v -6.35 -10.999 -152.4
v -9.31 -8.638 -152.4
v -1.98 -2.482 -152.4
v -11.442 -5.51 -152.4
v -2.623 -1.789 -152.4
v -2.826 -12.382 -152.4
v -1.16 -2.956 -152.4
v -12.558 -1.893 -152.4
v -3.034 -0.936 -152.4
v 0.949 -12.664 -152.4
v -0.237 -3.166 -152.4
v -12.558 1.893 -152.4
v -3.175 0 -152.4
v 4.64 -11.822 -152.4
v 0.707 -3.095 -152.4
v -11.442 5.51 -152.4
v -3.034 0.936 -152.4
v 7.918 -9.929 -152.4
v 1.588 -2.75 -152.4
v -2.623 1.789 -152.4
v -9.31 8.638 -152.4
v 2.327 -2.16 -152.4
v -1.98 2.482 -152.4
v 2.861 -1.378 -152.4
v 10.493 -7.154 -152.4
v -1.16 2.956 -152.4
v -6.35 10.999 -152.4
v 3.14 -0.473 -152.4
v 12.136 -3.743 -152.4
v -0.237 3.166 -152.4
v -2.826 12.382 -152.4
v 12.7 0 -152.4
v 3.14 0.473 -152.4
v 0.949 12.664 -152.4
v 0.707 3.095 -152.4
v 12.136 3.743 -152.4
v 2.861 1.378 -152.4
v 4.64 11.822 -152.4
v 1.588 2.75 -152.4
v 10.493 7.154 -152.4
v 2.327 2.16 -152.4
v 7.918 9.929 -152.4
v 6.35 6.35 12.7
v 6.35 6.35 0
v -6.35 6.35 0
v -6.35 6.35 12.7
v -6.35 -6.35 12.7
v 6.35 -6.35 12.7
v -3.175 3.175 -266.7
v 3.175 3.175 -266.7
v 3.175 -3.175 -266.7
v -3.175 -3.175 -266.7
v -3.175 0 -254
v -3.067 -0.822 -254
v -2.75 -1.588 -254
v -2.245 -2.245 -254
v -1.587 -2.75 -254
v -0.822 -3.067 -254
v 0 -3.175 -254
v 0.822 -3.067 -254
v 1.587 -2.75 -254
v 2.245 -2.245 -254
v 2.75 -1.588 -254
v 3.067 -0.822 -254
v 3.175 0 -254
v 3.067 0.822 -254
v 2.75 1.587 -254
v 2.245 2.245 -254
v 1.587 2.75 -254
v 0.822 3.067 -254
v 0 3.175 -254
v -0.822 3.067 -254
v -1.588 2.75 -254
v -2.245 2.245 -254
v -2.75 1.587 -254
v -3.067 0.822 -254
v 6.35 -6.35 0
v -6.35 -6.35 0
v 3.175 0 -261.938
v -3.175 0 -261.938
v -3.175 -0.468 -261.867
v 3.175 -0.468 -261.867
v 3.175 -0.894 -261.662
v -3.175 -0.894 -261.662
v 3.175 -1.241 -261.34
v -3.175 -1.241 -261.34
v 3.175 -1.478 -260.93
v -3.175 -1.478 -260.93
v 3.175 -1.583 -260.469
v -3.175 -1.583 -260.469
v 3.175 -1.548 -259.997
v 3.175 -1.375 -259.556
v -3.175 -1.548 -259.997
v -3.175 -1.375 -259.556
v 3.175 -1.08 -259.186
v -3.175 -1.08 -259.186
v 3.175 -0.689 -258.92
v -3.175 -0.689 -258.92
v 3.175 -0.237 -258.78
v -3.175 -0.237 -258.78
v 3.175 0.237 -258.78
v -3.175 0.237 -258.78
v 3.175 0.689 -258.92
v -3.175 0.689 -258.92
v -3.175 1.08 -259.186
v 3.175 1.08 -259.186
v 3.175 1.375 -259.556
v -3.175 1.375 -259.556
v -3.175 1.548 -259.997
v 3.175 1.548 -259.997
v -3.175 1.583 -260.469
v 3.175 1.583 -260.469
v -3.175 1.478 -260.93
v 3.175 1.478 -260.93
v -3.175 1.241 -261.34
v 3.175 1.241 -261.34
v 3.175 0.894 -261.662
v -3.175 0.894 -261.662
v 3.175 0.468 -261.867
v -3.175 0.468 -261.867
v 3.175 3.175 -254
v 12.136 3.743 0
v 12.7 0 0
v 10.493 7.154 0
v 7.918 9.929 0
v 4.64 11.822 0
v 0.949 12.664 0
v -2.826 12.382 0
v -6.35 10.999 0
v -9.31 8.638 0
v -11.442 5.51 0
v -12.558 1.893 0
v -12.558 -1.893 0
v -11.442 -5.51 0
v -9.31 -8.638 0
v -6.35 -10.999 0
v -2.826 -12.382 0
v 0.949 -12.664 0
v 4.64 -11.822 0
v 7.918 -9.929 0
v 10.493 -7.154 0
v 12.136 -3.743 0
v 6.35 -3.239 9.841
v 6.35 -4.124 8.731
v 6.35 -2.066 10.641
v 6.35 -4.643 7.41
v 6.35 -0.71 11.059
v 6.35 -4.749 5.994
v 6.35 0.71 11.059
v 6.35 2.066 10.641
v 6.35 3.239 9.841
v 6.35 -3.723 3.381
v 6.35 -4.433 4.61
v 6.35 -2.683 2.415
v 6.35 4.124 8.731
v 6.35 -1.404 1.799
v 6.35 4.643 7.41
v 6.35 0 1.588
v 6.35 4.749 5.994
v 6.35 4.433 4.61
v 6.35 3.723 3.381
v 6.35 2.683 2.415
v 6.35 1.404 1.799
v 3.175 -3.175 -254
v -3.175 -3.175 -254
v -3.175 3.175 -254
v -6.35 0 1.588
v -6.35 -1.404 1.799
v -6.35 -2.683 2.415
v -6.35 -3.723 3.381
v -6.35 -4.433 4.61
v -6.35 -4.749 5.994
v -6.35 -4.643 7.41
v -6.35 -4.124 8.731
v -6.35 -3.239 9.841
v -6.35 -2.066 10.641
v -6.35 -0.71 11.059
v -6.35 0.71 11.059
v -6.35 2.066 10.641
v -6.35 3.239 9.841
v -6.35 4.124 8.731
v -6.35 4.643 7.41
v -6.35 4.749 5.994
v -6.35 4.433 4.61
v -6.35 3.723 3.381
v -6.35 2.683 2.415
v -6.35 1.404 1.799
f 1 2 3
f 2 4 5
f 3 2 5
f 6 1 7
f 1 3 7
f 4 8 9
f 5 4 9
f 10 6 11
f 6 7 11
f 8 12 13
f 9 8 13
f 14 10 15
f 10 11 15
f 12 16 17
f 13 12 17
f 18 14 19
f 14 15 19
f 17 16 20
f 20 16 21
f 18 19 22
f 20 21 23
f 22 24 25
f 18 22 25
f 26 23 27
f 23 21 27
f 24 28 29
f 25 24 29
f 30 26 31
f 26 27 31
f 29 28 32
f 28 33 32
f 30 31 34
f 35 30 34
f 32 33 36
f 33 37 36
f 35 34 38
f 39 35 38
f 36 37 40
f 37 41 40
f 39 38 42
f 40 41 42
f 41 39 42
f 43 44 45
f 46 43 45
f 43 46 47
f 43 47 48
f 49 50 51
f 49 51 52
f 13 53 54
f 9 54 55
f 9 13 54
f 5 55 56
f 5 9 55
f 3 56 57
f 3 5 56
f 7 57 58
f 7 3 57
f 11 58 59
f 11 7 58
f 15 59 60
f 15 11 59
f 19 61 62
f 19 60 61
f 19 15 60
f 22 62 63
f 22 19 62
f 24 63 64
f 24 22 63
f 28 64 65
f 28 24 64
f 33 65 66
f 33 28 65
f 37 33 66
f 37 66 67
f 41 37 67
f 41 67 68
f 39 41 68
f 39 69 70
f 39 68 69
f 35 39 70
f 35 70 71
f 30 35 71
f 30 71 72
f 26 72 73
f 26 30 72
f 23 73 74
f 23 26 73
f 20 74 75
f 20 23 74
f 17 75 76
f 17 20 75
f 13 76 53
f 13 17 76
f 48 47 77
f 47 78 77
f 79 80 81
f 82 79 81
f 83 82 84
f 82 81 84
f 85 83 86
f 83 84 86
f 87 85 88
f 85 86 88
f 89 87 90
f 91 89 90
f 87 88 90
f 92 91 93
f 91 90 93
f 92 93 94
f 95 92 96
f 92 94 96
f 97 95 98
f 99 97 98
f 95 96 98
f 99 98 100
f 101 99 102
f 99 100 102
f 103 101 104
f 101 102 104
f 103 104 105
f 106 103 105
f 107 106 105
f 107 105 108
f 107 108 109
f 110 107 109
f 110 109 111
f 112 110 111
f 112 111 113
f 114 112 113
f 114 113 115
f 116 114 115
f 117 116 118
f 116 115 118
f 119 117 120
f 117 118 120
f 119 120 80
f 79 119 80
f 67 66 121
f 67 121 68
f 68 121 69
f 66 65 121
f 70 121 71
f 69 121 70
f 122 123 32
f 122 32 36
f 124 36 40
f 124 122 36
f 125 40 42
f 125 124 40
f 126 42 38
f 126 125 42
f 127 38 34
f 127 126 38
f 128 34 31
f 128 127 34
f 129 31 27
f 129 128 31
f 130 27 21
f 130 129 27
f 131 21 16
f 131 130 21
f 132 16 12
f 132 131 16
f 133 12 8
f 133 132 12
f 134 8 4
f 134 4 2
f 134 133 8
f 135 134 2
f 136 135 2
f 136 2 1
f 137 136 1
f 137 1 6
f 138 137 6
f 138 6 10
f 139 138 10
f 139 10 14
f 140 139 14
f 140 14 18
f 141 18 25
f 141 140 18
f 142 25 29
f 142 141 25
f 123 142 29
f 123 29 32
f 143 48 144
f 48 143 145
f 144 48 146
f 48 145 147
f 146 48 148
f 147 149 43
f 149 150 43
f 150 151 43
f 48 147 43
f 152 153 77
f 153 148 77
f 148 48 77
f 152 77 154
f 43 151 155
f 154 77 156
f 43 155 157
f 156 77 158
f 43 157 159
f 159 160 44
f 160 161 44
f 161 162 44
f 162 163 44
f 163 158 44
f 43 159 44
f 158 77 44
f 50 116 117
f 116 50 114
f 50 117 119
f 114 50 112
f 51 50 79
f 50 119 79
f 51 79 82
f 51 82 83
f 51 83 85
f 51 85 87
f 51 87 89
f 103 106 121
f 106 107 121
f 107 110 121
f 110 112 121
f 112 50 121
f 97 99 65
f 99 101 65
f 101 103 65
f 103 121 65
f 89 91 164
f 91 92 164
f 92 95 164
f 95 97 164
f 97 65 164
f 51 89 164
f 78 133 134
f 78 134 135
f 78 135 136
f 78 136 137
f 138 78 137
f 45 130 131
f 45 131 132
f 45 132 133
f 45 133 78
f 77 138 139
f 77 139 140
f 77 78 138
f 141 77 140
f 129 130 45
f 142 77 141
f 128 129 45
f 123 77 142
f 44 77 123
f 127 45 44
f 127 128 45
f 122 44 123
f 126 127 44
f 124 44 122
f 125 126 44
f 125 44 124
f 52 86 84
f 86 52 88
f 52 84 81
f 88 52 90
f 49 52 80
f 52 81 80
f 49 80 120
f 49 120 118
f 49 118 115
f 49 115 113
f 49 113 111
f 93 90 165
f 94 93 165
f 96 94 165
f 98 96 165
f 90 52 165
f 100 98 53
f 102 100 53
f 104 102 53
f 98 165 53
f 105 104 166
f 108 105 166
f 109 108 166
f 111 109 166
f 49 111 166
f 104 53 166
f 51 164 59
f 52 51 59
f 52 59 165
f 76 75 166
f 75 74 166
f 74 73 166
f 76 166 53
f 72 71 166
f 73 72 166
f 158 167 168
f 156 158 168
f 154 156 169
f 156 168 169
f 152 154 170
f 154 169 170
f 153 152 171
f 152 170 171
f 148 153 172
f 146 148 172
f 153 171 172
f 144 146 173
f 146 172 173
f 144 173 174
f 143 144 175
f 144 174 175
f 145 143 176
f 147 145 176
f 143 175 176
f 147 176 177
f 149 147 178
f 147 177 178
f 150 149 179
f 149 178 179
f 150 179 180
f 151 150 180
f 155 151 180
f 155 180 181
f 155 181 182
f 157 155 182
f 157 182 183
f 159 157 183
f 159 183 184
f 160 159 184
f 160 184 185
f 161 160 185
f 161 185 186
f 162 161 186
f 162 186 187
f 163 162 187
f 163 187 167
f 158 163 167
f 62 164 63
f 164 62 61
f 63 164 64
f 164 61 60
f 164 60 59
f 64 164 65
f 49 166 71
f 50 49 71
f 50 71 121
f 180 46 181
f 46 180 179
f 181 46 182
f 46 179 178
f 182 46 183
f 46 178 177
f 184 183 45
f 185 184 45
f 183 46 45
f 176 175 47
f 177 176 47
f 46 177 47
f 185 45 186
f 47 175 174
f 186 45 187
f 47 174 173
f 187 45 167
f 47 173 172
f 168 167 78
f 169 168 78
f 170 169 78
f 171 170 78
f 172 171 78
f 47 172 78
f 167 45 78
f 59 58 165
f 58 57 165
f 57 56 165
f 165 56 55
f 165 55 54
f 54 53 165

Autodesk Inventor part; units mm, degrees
ref_plane "YZ Plane" through (0, 0, 0) normal (1, 0, 0) x (0, 1, 0)
ref_plane "XZ Plane" through (0, 0, 0) normal (0, 1, 0) x (-1, 0, 0)
ref_plane "XY Plane" through (0, 0, 0) normal (0, 0, 1) x (1, 0, 0)
sketch "Sketch1" plane through (0, 0, 0) normal (0, 0, 1) x (1, 0, 0)
  circle A0 centre (0, 0) radius 12.7
  line L0 (-6.35, -6.35) -> (6.35, -6.35)
  line L1 (6.35, -6.35) -> (6.35, 6.35)
  line L2 (6.35, 6.35) -> (-6.35, 6.35)
  line L3 (-6.35, 6.35) -> (-6.35, -6.35)
  point P0 (-6.35, 0)
  point P1 (0, 6.35)
  dimension "d0" = 25.4
  dimension "d1" = 12.7
  dimension "d2" = 12.7
extrude "Extrusion1" add sketch "Sketch1" against normal blind 152.4 contours A0 | L3 L2 L1 L0
extrude "Extrusion2" add sketch "Sketch1" along normal blind 12.7 contours L3 L2 L1 L0
sketch "Sketch2" plane through (6.35, -6.35, 12.7) normal (1, 0, 0) x (0, 0, -1)
  point P0 (12.7, 6.35)
  point P1 (6.35, 6.35)
hole "Hole1" at (6.35, 0, 6.35) direction (-1, 0, 0) diameter 9.525 depth 25.4 tip angle 118
thread "Thread1" size "3/8-16 UNC" class "2B" standard "ANSI Unified Screw Threads" full length
sketch "Sketch3" plane through (0, 0, -152.4) normal (0, 0, -1) x (-1, 0, 0)
  circle A0 centre (0, 0) radius 12.7 projected
  circle A1 centre (0, 0) radius 3.175
  dimension "d16" = 6.35
extrude "Extrusion3" add sketch "Sketch3" along normal blind 101.6 contours A1
sketch "Sketch4" plane through (0, 0, -254) normal (0, 0, -1) x (-1, 0, 0)
  circle A0 centre (0, 0) radius 3.175 projected
  line L0 (-3.175, -3.175) -> (3.175, -3.175)
  line L1 (3.175, -3.175) -> (3.175, 3.175)
  line L2 (3.175, 3.175) -> (-3.175, 3.175)
  line L3 (-3.175, 3.175) -> (-3.175, -3.175)
extrude "Extrusion4" add sketch "Sketch4" along normal blind 12.7
sketch "Sketch5" plane through (3.175, 0, -254) normal (1, 0, 0) x (0, 0, -1)
  line L0 (0, -3.175) -> (12.7, -3.175) projected
  point P0 (0, 0)
  point P1 (-254, 0)
  point P2 (6.35, 0)
  point P3 (6.35, -3.175)
hole "Hole2" at (3.175, 0, -260.35) direction (-1, 0, 0) diameter 3.175 depth 25.4 tip angle 118
properties part number "temp_cylinder_.1inch_4stroke"
